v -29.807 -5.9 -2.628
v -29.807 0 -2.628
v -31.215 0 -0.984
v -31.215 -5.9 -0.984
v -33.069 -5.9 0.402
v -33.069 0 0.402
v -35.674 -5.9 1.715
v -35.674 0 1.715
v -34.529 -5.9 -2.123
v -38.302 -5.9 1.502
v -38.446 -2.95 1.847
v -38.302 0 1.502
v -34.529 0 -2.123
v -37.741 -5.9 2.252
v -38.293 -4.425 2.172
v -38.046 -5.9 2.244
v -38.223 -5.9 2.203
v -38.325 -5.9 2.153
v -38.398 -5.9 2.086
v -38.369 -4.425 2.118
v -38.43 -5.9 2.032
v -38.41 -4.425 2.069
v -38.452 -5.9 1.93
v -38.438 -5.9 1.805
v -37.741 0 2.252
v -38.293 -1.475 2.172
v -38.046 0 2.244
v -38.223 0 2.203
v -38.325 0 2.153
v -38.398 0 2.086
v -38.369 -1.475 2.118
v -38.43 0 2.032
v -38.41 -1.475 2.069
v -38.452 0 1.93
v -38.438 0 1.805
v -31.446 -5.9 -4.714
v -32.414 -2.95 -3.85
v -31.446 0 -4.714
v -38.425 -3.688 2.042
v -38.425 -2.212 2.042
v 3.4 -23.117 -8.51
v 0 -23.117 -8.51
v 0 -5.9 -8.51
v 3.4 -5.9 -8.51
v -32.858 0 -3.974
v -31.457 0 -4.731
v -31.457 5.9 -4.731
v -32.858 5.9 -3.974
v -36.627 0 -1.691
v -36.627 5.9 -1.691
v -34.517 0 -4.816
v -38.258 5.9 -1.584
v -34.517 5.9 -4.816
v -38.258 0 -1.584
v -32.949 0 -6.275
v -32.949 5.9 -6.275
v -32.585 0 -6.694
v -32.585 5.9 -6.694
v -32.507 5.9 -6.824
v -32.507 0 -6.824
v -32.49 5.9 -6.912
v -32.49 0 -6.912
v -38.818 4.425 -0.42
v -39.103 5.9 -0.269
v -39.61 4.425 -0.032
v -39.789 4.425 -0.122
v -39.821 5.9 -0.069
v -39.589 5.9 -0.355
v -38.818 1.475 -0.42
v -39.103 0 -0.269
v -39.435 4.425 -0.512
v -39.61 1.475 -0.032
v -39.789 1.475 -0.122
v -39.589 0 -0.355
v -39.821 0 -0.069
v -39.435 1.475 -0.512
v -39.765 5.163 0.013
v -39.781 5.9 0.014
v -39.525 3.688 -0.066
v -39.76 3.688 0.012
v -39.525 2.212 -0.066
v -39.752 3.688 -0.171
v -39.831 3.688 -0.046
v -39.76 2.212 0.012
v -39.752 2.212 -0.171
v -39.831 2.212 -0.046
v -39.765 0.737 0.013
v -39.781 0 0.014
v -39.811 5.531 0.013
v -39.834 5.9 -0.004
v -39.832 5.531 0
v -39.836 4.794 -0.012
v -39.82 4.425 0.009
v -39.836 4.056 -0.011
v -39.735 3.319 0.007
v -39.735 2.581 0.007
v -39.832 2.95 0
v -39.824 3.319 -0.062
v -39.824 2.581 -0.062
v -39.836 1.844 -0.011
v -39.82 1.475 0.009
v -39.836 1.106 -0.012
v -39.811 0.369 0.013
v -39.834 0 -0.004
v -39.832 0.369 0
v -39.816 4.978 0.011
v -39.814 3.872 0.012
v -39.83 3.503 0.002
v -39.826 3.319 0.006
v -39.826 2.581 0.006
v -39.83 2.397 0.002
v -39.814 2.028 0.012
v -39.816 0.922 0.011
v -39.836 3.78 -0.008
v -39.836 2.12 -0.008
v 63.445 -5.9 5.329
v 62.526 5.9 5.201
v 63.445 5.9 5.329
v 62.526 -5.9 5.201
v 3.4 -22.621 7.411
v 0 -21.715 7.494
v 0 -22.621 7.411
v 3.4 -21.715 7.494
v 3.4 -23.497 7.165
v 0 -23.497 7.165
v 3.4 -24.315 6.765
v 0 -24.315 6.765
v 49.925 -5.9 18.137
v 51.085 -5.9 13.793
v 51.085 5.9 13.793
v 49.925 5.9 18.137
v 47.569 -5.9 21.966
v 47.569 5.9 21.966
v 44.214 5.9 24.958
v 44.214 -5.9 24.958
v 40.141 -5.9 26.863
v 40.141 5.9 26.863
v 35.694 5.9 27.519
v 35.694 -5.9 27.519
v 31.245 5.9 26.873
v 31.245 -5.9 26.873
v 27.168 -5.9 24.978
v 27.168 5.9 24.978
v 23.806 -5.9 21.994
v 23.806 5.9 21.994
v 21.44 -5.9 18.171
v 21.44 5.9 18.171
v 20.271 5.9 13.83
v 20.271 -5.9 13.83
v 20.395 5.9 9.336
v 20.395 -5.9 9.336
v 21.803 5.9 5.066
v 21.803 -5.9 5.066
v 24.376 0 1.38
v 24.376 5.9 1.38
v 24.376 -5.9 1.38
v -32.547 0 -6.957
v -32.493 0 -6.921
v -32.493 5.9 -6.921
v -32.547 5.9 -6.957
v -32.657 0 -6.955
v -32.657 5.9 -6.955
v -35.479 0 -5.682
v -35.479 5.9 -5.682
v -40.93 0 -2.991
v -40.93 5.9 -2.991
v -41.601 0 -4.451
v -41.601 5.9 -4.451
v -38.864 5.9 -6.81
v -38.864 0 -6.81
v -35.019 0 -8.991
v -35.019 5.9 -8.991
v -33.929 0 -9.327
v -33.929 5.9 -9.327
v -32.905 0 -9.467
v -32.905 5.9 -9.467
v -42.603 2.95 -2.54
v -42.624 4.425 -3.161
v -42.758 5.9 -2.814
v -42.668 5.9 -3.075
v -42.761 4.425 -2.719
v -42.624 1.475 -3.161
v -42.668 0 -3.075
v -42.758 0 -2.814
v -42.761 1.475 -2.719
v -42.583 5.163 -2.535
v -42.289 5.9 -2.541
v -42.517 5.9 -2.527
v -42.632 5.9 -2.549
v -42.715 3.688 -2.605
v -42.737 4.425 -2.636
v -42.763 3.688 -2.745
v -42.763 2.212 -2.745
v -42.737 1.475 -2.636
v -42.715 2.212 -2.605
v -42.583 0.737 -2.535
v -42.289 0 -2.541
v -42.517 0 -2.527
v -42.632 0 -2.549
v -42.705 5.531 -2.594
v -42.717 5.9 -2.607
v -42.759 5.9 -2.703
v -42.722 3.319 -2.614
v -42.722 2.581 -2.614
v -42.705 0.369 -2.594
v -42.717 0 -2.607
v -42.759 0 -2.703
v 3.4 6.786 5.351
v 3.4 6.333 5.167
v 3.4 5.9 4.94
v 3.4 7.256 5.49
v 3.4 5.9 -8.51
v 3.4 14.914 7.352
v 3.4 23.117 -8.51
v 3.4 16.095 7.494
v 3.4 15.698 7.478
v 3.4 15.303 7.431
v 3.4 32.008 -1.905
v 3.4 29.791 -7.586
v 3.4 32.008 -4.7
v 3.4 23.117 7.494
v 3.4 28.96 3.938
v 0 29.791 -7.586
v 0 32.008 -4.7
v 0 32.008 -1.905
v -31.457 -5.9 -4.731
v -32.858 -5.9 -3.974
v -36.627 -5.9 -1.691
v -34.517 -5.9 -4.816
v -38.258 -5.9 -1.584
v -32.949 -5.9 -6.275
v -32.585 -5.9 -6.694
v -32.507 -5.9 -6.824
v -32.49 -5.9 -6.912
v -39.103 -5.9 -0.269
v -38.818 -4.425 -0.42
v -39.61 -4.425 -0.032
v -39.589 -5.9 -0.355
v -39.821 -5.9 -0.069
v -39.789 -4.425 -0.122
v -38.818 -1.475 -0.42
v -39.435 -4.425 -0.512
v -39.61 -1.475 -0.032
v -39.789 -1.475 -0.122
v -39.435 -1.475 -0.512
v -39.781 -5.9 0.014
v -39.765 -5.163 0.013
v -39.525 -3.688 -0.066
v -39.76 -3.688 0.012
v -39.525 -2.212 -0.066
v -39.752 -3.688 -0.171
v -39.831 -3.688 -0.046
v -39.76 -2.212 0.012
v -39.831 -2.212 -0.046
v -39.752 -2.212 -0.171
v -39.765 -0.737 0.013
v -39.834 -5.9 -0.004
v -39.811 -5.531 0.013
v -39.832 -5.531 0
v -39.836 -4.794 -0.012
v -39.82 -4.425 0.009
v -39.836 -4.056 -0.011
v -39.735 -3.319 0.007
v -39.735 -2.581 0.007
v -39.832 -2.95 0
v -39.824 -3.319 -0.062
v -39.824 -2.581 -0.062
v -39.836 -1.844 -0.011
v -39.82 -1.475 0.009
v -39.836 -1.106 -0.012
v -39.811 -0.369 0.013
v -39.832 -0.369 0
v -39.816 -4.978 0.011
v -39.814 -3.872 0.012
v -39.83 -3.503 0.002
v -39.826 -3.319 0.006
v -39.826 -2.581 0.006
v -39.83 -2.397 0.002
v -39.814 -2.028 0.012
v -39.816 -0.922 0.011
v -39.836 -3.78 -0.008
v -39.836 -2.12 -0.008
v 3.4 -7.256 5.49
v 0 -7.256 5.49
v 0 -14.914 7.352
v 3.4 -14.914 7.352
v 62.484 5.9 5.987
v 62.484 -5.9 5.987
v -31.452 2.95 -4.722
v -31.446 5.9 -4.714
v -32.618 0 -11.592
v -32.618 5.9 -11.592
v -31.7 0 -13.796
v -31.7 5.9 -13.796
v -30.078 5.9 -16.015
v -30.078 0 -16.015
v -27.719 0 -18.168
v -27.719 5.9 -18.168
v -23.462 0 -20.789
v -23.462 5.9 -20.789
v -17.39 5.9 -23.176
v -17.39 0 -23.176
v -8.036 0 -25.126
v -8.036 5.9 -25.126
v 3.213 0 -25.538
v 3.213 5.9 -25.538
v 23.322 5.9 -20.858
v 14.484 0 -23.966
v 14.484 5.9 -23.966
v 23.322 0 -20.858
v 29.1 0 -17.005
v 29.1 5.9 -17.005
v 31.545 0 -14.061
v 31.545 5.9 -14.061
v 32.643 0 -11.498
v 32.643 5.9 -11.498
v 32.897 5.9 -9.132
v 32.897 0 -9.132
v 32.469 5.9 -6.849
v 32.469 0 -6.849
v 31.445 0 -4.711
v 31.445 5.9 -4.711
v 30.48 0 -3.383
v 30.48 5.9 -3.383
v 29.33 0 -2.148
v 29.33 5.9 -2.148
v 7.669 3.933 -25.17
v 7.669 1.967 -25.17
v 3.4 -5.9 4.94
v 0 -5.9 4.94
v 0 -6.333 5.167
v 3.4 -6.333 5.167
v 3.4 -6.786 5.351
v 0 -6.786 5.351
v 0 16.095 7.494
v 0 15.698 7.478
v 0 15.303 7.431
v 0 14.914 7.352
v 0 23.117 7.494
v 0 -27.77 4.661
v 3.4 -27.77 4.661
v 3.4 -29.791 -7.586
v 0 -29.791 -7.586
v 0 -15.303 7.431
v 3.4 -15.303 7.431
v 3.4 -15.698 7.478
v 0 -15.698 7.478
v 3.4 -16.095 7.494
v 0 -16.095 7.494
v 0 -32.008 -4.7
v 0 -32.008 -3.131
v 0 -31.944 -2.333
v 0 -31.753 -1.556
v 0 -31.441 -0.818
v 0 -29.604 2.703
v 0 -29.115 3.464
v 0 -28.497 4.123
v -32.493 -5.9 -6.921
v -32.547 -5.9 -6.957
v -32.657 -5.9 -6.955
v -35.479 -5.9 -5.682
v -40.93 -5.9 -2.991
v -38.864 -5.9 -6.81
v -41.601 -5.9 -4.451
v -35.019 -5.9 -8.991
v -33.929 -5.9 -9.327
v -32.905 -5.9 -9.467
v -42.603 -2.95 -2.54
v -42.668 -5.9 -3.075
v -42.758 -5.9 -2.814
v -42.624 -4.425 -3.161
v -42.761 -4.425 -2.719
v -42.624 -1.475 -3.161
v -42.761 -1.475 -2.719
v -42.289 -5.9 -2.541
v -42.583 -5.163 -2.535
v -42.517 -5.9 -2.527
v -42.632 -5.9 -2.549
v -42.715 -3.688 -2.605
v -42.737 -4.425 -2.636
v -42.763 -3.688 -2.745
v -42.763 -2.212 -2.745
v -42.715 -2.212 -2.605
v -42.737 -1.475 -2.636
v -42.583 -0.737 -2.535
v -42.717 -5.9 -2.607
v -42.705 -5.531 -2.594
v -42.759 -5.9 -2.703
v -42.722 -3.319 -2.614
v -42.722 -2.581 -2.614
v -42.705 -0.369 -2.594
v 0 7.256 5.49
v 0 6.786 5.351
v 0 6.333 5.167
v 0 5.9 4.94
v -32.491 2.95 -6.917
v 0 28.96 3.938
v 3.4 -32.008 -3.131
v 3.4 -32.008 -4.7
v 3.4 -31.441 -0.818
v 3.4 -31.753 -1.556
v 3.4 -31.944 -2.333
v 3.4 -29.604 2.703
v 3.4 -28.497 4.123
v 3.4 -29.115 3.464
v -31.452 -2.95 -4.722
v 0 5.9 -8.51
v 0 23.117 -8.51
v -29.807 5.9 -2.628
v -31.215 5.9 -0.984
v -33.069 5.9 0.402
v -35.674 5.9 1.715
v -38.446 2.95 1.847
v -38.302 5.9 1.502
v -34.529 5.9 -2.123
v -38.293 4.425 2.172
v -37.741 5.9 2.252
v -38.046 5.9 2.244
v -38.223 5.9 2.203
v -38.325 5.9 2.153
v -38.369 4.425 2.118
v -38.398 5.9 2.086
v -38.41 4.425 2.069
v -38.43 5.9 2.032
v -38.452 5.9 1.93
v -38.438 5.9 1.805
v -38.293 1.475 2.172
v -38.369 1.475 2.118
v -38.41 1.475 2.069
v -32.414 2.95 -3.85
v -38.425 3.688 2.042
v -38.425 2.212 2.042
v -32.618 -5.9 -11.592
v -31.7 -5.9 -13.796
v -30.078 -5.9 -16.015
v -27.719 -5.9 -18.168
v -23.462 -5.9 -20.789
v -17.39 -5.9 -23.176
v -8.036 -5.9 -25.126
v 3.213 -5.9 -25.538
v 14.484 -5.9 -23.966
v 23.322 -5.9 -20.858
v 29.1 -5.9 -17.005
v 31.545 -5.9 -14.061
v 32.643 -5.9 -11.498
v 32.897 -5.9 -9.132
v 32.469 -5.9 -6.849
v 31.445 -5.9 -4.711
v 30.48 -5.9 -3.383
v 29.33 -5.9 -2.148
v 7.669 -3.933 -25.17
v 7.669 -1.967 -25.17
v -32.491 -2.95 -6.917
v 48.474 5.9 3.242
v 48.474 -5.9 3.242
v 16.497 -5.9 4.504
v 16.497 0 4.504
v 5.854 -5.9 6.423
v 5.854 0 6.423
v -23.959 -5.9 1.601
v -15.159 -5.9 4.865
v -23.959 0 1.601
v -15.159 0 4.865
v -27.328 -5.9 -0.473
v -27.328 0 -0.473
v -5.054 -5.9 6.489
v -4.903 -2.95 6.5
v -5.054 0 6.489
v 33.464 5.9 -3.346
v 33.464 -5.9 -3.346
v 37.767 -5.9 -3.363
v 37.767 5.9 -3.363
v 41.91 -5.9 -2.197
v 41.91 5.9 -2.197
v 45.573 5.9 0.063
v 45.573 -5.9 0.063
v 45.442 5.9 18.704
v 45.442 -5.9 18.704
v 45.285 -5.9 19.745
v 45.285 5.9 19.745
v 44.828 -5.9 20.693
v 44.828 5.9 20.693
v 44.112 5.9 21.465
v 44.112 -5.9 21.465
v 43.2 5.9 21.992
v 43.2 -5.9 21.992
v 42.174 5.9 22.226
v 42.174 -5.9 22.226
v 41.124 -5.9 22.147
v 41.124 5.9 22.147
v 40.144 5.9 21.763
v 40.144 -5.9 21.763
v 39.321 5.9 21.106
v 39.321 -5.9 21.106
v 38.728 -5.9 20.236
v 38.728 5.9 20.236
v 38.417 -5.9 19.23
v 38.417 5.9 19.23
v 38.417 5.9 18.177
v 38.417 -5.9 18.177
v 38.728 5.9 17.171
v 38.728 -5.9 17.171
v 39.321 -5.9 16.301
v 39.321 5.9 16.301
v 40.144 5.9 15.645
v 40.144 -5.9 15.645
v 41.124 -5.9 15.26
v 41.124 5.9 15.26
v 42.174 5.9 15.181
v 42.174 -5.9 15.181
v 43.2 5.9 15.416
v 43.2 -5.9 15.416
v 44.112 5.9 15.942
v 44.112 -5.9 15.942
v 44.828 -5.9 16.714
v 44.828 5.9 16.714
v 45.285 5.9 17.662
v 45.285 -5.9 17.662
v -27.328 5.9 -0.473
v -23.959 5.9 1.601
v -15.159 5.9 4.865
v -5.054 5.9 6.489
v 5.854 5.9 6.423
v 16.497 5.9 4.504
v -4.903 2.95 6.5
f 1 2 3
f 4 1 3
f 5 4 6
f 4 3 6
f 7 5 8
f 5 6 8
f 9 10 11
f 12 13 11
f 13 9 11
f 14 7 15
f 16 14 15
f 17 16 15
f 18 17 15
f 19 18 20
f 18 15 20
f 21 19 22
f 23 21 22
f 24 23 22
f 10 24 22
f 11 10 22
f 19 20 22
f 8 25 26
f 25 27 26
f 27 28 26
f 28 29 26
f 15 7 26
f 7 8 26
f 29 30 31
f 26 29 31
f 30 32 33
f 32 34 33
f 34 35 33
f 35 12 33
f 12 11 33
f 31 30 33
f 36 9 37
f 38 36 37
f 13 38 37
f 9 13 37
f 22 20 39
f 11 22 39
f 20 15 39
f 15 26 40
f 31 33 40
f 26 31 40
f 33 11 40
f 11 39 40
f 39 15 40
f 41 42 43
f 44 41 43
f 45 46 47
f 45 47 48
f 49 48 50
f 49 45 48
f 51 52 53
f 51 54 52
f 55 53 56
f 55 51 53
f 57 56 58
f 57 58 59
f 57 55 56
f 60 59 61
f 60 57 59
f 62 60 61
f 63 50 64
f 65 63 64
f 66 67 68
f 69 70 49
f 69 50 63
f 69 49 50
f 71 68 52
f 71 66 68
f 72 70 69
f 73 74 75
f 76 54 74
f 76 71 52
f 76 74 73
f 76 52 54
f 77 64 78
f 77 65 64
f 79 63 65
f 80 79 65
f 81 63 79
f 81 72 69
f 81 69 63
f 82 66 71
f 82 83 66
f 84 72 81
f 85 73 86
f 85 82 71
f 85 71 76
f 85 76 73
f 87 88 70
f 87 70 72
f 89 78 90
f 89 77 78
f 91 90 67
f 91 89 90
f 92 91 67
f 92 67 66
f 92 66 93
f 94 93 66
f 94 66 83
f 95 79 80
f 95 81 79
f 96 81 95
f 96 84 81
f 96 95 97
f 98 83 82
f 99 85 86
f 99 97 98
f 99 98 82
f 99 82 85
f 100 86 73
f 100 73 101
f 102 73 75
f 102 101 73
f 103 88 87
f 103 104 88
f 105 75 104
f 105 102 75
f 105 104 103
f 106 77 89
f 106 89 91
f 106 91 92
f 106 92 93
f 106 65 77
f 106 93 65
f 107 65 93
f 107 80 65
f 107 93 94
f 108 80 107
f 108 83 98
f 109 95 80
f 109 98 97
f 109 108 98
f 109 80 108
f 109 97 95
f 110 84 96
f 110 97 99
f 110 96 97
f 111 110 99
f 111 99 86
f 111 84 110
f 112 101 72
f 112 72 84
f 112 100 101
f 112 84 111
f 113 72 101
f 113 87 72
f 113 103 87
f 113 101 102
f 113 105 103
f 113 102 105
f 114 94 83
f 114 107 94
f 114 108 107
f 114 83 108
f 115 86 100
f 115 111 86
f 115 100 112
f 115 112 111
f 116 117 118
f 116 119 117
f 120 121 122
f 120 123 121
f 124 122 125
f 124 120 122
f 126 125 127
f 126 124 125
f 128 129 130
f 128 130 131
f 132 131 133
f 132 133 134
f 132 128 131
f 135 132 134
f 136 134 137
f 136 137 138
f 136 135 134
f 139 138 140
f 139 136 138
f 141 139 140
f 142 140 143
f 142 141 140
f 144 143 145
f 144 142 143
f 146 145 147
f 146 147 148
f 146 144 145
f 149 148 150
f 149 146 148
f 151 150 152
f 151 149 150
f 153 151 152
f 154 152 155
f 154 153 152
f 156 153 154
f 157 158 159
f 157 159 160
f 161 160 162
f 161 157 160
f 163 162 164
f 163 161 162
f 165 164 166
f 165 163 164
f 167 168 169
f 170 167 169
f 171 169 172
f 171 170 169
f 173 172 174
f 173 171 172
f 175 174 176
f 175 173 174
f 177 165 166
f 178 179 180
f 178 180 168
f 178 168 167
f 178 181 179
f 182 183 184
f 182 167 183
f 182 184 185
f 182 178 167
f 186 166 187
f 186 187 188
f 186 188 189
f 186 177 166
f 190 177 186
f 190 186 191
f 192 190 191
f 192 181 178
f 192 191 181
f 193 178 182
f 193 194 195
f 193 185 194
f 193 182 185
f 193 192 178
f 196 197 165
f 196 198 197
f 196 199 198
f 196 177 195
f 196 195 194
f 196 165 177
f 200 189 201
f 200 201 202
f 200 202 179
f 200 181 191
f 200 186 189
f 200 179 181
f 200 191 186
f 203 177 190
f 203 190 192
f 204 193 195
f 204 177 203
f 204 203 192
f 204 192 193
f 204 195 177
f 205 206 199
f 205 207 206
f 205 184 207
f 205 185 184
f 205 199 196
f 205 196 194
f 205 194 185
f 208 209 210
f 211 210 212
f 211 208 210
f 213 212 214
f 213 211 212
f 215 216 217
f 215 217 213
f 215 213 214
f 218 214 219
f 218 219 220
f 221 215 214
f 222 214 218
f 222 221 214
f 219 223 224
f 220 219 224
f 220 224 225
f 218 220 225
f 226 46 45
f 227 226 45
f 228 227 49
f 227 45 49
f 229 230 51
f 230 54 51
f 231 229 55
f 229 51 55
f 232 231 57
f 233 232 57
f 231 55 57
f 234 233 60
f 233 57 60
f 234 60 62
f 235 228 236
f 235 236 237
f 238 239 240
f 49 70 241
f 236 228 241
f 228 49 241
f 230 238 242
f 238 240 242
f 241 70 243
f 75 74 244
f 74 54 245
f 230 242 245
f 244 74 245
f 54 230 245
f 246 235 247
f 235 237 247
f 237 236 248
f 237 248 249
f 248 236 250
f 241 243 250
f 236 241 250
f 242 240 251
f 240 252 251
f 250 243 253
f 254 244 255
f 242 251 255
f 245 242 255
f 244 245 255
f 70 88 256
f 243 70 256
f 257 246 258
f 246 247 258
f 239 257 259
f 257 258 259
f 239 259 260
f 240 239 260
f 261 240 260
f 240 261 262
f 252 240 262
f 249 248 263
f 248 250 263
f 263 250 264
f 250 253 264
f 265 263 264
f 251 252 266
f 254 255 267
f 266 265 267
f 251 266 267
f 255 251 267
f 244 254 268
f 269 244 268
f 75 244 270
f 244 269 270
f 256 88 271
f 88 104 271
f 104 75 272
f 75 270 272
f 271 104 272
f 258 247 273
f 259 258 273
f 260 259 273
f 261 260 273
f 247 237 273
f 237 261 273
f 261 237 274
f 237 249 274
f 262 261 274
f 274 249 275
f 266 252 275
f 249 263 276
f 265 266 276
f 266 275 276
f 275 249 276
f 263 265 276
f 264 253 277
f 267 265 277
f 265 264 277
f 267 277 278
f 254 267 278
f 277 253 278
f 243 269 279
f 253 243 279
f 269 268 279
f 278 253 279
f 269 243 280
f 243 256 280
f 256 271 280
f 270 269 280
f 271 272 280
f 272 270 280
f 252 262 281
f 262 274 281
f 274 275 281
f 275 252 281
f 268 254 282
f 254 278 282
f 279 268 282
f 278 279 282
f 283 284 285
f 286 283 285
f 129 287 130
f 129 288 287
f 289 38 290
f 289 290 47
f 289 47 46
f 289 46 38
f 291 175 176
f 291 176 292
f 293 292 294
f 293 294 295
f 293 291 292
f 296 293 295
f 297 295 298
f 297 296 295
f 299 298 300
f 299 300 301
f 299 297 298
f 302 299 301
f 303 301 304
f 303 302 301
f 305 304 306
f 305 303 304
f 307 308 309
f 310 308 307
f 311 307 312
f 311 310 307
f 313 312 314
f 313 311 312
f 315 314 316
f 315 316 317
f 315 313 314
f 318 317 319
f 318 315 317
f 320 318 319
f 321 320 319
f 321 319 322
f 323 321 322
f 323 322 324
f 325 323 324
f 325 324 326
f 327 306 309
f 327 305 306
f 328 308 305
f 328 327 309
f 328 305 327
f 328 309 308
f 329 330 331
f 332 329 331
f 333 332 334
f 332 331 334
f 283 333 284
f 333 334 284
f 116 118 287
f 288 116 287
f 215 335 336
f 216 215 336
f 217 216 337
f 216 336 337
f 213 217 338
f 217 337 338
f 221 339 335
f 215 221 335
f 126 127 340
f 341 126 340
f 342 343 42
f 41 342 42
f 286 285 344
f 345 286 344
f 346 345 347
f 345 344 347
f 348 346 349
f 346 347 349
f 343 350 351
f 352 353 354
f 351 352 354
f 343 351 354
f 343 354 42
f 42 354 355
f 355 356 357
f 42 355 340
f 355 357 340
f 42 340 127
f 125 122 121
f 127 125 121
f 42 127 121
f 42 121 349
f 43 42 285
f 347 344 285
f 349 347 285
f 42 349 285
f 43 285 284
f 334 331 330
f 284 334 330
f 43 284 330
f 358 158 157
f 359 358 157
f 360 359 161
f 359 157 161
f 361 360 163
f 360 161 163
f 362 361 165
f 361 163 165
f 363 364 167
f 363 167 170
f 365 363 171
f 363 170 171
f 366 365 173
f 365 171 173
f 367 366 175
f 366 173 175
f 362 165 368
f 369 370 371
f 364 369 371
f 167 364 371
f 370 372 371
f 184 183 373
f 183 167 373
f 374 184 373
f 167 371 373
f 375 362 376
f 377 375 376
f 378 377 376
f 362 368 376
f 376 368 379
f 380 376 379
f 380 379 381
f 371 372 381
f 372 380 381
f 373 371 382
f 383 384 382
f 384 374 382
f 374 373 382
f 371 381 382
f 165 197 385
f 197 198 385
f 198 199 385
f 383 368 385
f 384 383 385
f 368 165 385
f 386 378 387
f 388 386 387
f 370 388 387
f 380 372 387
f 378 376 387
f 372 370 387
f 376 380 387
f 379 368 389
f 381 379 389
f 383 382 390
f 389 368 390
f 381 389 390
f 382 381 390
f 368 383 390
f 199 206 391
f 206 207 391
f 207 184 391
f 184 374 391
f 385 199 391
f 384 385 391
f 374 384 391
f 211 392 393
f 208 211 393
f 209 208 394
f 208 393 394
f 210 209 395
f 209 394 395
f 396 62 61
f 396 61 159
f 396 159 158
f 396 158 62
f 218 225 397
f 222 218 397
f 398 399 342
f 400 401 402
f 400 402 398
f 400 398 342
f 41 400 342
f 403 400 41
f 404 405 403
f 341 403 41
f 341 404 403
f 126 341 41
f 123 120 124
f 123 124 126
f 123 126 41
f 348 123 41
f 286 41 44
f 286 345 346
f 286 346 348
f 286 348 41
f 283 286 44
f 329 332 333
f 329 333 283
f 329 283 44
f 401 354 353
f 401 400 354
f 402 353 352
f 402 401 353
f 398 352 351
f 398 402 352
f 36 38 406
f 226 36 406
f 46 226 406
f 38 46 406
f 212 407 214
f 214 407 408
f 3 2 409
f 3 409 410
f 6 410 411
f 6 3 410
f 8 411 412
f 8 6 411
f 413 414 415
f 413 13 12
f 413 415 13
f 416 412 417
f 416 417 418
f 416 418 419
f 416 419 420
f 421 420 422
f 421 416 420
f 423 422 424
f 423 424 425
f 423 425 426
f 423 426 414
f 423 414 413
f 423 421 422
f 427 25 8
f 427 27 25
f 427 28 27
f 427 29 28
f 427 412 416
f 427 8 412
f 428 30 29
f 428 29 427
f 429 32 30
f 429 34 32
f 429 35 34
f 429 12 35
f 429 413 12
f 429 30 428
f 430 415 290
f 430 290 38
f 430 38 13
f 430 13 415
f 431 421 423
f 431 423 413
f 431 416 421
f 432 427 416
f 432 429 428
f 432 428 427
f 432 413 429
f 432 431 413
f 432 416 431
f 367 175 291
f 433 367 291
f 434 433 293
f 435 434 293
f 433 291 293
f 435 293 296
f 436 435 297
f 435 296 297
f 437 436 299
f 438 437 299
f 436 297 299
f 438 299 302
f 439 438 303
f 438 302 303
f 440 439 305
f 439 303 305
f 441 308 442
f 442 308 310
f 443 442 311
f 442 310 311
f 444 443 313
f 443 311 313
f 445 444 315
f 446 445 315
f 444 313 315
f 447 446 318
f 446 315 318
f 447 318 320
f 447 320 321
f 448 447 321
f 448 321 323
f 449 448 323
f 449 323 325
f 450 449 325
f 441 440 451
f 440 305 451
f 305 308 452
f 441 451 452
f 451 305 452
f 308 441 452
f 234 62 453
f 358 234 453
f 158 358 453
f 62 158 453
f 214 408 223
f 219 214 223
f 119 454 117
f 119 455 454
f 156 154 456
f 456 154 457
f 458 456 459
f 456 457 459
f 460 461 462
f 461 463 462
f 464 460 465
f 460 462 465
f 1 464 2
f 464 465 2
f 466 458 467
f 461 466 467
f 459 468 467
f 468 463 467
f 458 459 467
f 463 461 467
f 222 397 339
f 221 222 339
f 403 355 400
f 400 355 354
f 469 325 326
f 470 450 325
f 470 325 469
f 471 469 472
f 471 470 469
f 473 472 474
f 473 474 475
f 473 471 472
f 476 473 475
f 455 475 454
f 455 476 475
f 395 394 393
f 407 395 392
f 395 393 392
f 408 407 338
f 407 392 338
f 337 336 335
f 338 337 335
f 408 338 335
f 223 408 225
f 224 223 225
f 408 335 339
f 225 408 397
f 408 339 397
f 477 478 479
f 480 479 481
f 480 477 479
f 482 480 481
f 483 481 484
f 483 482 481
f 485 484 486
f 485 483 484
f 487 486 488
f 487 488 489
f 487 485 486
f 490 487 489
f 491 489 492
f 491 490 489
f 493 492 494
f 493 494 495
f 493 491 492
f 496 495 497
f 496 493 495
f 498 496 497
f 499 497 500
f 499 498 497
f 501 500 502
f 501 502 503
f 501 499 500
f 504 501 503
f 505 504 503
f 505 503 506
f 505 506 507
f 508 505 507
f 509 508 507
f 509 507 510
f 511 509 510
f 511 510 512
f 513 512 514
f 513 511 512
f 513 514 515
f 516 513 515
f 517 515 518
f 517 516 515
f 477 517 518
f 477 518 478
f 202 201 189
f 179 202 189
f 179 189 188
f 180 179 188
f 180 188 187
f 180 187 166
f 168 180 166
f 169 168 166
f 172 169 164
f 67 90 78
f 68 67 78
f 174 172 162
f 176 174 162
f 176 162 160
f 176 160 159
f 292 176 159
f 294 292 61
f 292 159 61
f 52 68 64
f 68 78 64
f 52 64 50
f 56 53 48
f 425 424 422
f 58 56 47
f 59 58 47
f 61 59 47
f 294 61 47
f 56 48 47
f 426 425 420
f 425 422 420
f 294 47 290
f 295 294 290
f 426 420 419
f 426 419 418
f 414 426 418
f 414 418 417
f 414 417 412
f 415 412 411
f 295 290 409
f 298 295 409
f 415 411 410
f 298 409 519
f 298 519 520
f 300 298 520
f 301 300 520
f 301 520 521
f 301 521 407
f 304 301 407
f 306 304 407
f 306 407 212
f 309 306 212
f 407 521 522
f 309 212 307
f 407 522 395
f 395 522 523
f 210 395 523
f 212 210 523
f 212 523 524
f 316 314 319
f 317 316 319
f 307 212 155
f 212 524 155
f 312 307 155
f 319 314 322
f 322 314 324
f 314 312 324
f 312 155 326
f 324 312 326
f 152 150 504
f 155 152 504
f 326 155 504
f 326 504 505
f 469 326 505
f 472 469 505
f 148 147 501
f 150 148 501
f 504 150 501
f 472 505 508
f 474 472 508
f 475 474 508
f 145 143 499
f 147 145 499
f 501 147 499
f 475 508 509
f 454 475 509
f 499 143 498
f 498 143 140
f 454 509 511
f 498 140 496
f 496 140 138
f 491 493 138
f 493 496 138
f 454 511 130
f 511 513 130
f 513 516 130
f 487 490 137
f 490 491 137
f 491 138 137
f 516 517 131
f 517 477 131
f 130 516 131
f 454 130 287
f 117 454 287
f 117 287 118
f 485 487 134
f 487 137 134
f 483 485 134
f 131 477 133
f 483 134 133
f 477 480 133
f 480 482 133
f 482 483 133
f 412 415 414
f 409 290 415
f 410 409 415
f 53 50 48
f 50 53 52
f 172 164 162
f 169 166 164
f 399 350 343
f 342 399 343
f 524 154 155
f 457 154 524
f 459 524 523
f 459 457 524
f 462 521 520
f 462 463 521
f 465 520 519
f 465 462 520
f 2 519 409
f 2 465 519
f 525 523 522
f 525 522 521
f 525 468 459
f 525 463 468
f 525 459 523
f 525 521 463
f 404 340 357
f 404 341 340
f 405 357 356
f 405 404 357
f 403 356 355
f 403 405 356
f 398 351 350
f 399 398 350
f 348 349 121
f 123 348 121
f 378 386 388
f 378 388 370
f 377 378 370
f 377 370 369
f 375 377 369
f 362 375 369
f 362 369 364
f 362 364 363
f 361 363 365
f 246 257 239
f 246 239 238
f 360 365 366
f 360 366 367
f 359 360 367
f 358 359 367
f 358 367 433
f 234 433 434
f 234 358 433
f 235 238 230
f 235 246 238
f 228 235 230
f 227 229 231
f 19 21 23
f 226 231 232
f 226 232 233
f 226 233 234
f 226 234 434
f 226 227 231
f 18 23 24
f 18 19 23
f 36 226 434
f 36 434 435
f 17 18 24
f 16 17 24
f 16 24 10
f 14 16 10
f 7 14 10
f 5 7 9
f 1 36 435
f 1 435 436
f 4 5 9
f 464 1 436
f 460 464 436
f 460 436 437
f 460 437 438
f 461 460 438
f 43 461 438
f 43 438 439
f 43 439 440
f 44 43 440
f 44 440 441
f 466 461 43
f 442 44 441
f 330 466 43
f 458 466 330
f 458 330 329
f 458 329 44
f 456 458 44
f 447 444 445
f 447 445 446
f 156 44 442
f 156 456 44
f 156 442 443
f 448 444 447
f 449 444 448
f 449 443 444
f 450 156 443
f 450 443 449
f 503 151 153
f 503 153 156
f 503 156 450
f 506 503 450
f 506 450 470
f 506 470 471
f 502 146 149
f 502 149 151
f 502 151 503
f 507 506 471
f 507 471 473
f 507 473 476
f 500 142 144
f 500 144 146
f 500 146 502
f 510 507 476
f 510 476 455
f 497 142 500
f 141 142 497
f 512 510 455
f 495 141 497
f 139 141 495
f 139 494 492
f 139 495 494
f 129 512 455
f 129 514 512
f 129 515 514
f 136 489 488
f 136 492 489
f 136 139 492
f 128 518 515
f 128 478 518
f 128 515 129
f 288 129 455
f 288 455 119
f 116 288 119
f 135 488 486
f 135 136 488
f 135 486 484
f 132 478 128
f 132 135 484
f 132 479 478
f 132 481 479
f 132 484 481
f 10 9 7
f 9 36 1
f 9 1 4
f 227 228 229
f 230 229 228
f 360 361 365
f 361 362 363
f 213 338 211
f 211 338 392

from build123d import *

# Parameters (mm, degrees)
F2_DEPTH = 3.4
F0_R     = 3.5322272549
F3_DEPTH = 5.9
F5_R     = 5


with BuildPart() as f2:
    # F1 (on Right) → F2 (new body)
    with BuildSketch(Plane.YZ):
        with BuildLine():
            Line((5.1899361501, 4.4330699), (0, 0))
            Line((0, 0), (-5.1899361501, 4.4330699))
            ThreePointArc((-5.1899361501, 4.4330699), (-6.1606445906, 5.0827789403), (-7.2556070337, 5.4895392649))
            Line((-7.2556070337, 5.4895392649), (-14.9135797825, 7.3522897826))
            ThreePointArc((-14.9135797825, 7.3522897826), (-15.5002285919, 7.4584099911), (-16.0953379116, 7.4939518236))
            Line((-16.0953379116, 7.4939518236), (-23.1169369072, 7.4939518236))
            Line((-23.1169369072, 7.4939518236), (-28.959678486, 3.9375000633))
            Line((-28.959678486, 3.9375000633), (-32.0080667734, -1.9052419811))
            Line((-32.0080667734, -1.9052419811), (-32.0080667734, -4.6995966695))
            Line((-32.0080667734, -4.6995966695), (-29.7905169427, -7.5855152681))
            Line((-29.7905169427, -7.5855152681), (-23.1169369072, -8.5100810975))
            Line((-23.1169369072, -8.5100810975), (-15.750002116, -8.5100810975))
            Line((-15.750002116, -8.5100810975), (-8.8911280036, -8.5100810975))
            Line((-8.8911280036, -8.5100810975), (-3.3024190925, -8.5100810975))
            Line((-3.3024190925, -8.5100810975), (0, -8.5100810975))
            Line((0, -8.5100810975), (3.3024190925, -8.5100810975))
            Line((3.3024190925, -8.5100810975), (8.8911280036, -8.5100810975))
            Line((8.8911280036, -8.5100810975), (15.750002116, -8.5100810975))
            Line((15.750002116, -8.5100810975), (23.1169369072, -8.5100810975))
            Line((23.1169369072, -8.5100810975), (29.7905169427, -7.5855152681))
            Line((29.7905169427, -7.5855152681), (32.0080667734, -4.6995966695))
            Line((32.0080667734, -4.6995966695), (32.0080667734, -1.9052419811))
            Line((32.0080667734, -1.9052419811), (28.959678486, 3.9375000633))
            Line((28.959678486, 3.9375000633), (23.1169369072, 7.4939518236))
            Line((23.1169369072, 7.4939518236), (16.0953379116, 7.4939518236))
            ThreePointArc((16.0953379116, 7.4939518236), (15.5002285919, 7.4584099911), (14.9135797825, 7.3522897826))
            Line((14.9135797825, 7.3522897826), (7.2556070337, 5.4895392649))
            ThreePointArc((7.2556070337, 5.4895392649), (6.1606445906, 5.0827789403), (5.1899361501, 4.4330699))
        make_face()
    extrude(amount=F2_DEPTH)

    # F0 (on Front) → F3 (join)
    with BuildSketch(Plane.XZ):
        with BuildLine():
            ThreePointArc((50.7238964132, 8.2425397257), (51.0712900407, 10.1106775656), (51.1876700084, 12.0072737336))
            ThreePointArc((51.1876700084, 12.0072737336), (51.1618612788, 12.9017204052), (51.0845209695, 13.7931907724))
            ThreePointArc((51.0845209695, 13.7931907724), (29.1373428837, 26.0743183846), (24.3759328436, 1.379507274))
            add(Edge.make_bspline(
                [(29.3300002621, -2.147720467), (27.333914584, -0.2214232297), (24.3759328436, 1.379507274)],
                knots=[3.6120387141, 3.6120387141, 3.6120387141, 3.878117372, 3.878117372, 3.878117372], degree=2, weights=[1, 0.9911633137, 1]))
            ThreePointArc((29.3300002621, -2.147720467), (39.8793900631, -2.9244261965), (48.473942124, 3.2421426902))
            ThreePointArc((48.473942124, 3.2421426902), (49.8216153086, 5.6421379828), (50.7238964132, 8.2425397257))
        make_face()
        with Locations((41.9100001454, 18.703635782)):
            Circle(F0_R, mode=Mode.SUBTRACT)
        with BuildLine():
            ThreePointArc((51.0845209695, 13.7931907724), (51.1618612788, 12.9017204052), (51.1876700084, 12.0072737336))
            ThreePointArc((51.1876700084, 12.0072737336), (51.0712900407, 10.1106775656), (50.7238964132, 8.2425397257))
            Line((50.7238964132, 8.2425397257), (62.4843521348, 5.9868156539))
            Line((62.4843521348, 5.9868156539), (51.0845209695, 13.7931907724))
        make_face()
        with BuildLine():
            Line((62.5255977297, 5.2005367167), (50.7238964132, 8.2425397257))
            ThreePointArc((50.7238964132, 8.2425397257), (49.8216153086, 5.6421379828), (48.473942124, 3.2421426902))
            Line((48.473942124, 3.2421426902), (62.5255977297, 5.2005367167))
        make_face()
        Polygon((62.4843521348, 5.9868156539), (50.7238964132, 8.2425397257), (62.5255977297, 5.2005367167), (63.4453743696, 5.3287269548), align=None)
        with BuildLine():
            add(Edge.make_bspline(
                [(29.3300002621, -2.147720467), (27.333914584, -0.2214232297), (24.3759328436, 1.379507274)],
                knots=[3.6120387141, 3.6120387141, 3.6120387141, 3.878117372, 3.878117372, 3.878117372], degree=2, weights=[1, 0.9911633137, 1]))
            ThreePointArc((24.3759328436, 1.379507274), (26.6784202094, -0.6292606996), (29.3300002621, -2.147720467))
        make_face()
        with BuildLine():
            ThreePointArc((29.3300002621, -2.147720467), (26.6784202094, -0.6292606996), (24.3759328436, 1.379507274))
            add(Edge.make_bspline(
                [(24.3759328436, 1.379507274), (-8.8534444598, 19.3640414648), (-29.8070528208, -2.6275665701)],
                knots=[3.878117372, 3.878117372, 3.878117372, 5.8458046955, 5.8458046955, 5.8458046955], degree=2, weights=[1, 0.553826289, 1]))
            add(Edge.make_bspline(
                [(-32.9045467079, -9.4672730193), (-29.5871785013, -9.567963443), (-27.9260766744, -5.6824967661), (-29.8070528208, -2.6275665701)],
                knots=[0.8754804976, 0.8754804976, 0.8754804976, 0.8754804976, 1, 1, 1, 1], degree=3))
            add(Edge.make_bspline(
                [(-32.9045467079, -9.4672730193), (-32.9045467079, -29.9423508925), (7.668729702, -25.1704317036), (48.2420061119, -20.3985125147), (29.3300002621, -2.147720467)],
                knots=[0, 0, 0, 1.8060193571, 1.8060193571, 3.6120387141, 3.6120387141, 3.6120387141], degree=2, weights=[1, 0.6192495943, 1, 0.6192495943, 1]))
        make_face()
        with BuildLine():
            add(Edge.make_bspline(
                [(-32.9045467079, -9.4672730193), (-29.5871785013, -9.567963443), (-27.9260766744, -5.6824967661), (-29.8070528208, -2.6275665701)],
                knots=[0.8754804976, 0.8754804976, 0.8754804976, 0.8754804976, 1, 1, 1, 1], degree=3))
            add(Edge.make_bspline(
                [(-29.8070528208, -2.6275665701), (-30.7742242797, -3.6426497605), (-31.4464247132, -4.7135619811)],
                knots=[5.8458046955, 5.8458046955, 5.8458046955, 5.9843713156, 5.9843713156, 5.9843713156], degree=2, weights=[1, 0.9976008714, 1]))
            add(Edge.make_bspline(
                [(-31.4464247132, -4.7135619811), (-31.4433181339, -4.7240720501), (-31.4468398493, -4.730001777), (-31.4574065674, -4.7310930395)],
                knots=[0.2781978727, 0.2781978727, 0.2781978727, 0.2781978727, 0.2825287093, 0.2825287093, 0.2825287093, 0.2825287093], degree=3))
            add(Edge.make_bspline(
                [(-31.4574065674, -4.7310930395), (-32.1281797541, -5.804061611), (-32.4900409288, -6.9122519104)],
                knots=[5.9855071177, 5.9855071177, 5.9855071177, 6.1242906473, 6.1242906473, 6.1242906473], degree=2, weights=[1, 0.9975933574, 1]))
            add(Edge.make_bspline(
                [(-32.4900409288, -6.9122519104), (-32.490766677, -6.9152706245), (-32.4917039163, -6.9181433868), (-32.4928506806, -6.9208716131)],
                knots=[0.5677650433, 0.5677650433, 0.5677650433, 0.5677650433, 0.5685139027, 0.5685139027, 0.5685139027, 0.5685139027], degree=3))
            add(Edge.make_bspline(
                [(-32.4928506806, -6.9208716131), (-32.9045467079, -8.1860571398), (-32.9045467079, -9.4672730193)],
                knots=[6.1248312335, 6.1248312335, 6.1248312335, 6.2831853072, 6.2831853072, 6.2831853072], degree=2, weights=[1, 0.9968671356, 1]))
        make_face()
        with BuildLine():
            add(Edge.make_bspline(
                [(-29.8070528208, -2.6275665701), (-30.7742242797, -3.6426497605), (-31.4464247132, -4.7135619811)],
                knots=[5.8458046955, 5.8458046955, 5.8458046955, 5.9843713156, 5.9843713156, 5.9843713156], degree=2, weights=[1, 0.9976008714, 1]))
            add(Edge.make_bspline(
                [(-29.8070528208, -2.6275665701), (-31.9482338648, 0.8499674958), (-45.1589938624, 5.5629545939), (-31.5443046351, -4.3824180992), (-31.4464247132, -4.7135619811)],
                knots=[0, 0, 0, 0, 0.1417449119, 0.2781978727, 0.2781978727, 0.2781978727, 0.2781978727], degree=3))
        make_face()
        with BuildLine():
            add(Edge.make_bspline(
                [(-32.4928506806, -6.9208716131), (-32.72268534, -7.4676631063), (-50.4062087574, 3.2883189421), (-37.084044413, -9.3404148085), (-32.9045467079, -9.4672730193)],
                knots=[0.5685139027, 0.5685139027, 0.5685139027, 0.5685139027, 0.718600422, 0.8754804976, 0.8754804976, 0.8754804976, 0.8754804976], degree=3))
            add(Edge.make_bspline(
                [(-32.4928506806, -6.9208716131), (-32.9045467079, -8.1860571398), (-32.9045467079, -9.4672730193)],
                knots=[6.1248312335, 6.1248312335, 6.1248312335, 6.2831853072, 6.2831853072, 6.2831853072], degree=2, weights=[1, 0.9968671356, 1]))
        make_face()
        with BuildLine():
            add(Edge.make_bspline(
                [(-31.4464247132, -4.7135619811), (-31.4433181339, -4.7240720501), (-31.4468398493, -4.730001777), (-31.4574065674, -4.7310930395)],
                knots=[0.2781978727, 0.2781978727, 0.2781978727, 0.2781978727, 0.2825287093, 0.2825287093, 0.2825287093, 0.2825287093], degree=3))
            add(Edge.make_bspline(
                [(-31.4464247132, -4.7135619811), (-31.4519257839, -4.72232598), (-31.4574065674, -4.7310930395)],
                knots=[5.9843713156, 5.9843713156, 5.9843713156, 5.9855071177, 5.9855071177, 5.9855071177], degree=2, weights=[1, 0.9999998387, 1]))
        make_face()
        with BuildLine():
            add(Edge.make_bspline(
                [(-32.4900409288, -6.9122519104), (-32.4914481785, -6.9165615754), (-32.4928506806, -6.9208716131)],
                knots=[6.1242906473, 6.1242906473, 6.1242906473, 6.1248312335, 6.1248312335, 6.1248312335], degree=2, weights=[1, 0.9999999635, 1]))
            add(Edge.make_bspline(
                [(-32.4900409288, -6.9122519104), (-32.490766677, -6.9152706245), (-32.4917039163, -6.9181433868), (-32.4928506806, -6.9208716131)],
                knots=[0.5677650433, 0.5677650433, 0.5677650433, 0.5677650433, 0.5685139027, 0.5685139027, 0.5685139027, 0.5685139027], degree=3))
        make_face()
        with BuildLine():
            add(Edge.make_bspline(
                [(-31.4574065674, -4.7310930395), (-32.1281797541, -5.804061611), (-32.4900409288, -6.9122519104)],
                knots=[5.9855071177, 5.9855071177, 5.9855071177, 6.1242906473, 6.1242906473, 6.1242906473], degree=2, weights=[1, 0.9975933574, 1]))
            add(Edge.make_bspline(
                [(-31.4574065674, -4.7310930395), (-31.8012683369, -4.7666048664), (-47.5965511675, 5.5316568956), (-32.3501919761, -6.33055706), (-32.4900409288, -6.9122519104)],
                knots=[0.2825287093, 0.2825287093, 0.2825287093, 0.2825287093, 0.4234626411, 0.5677650433, 0.5677650433, 0.5677650433, 0.5677650433], degree=3))
        make_face()
    extrude(amount=F3_DEPTH)

    # F4: F2 across plane


with BuildPart() as f2_1:
    add(f2.part)
    add(f2.part.mirror(Plane.XZ))

    # F5
    f5_edges = [f2_1.edges().sort_by_distance(p)[0] for p in [
        (1.7, -28.959678, 3.9375),
        (1.7, -23.116937, 7.493952),
        (1.7, -16.095338, 7.493952),
        (1.7, -32.008067, -1.905242),
    ]]
    fillet(f5_edges, radius=F5_R)


solid = f2_1.part
